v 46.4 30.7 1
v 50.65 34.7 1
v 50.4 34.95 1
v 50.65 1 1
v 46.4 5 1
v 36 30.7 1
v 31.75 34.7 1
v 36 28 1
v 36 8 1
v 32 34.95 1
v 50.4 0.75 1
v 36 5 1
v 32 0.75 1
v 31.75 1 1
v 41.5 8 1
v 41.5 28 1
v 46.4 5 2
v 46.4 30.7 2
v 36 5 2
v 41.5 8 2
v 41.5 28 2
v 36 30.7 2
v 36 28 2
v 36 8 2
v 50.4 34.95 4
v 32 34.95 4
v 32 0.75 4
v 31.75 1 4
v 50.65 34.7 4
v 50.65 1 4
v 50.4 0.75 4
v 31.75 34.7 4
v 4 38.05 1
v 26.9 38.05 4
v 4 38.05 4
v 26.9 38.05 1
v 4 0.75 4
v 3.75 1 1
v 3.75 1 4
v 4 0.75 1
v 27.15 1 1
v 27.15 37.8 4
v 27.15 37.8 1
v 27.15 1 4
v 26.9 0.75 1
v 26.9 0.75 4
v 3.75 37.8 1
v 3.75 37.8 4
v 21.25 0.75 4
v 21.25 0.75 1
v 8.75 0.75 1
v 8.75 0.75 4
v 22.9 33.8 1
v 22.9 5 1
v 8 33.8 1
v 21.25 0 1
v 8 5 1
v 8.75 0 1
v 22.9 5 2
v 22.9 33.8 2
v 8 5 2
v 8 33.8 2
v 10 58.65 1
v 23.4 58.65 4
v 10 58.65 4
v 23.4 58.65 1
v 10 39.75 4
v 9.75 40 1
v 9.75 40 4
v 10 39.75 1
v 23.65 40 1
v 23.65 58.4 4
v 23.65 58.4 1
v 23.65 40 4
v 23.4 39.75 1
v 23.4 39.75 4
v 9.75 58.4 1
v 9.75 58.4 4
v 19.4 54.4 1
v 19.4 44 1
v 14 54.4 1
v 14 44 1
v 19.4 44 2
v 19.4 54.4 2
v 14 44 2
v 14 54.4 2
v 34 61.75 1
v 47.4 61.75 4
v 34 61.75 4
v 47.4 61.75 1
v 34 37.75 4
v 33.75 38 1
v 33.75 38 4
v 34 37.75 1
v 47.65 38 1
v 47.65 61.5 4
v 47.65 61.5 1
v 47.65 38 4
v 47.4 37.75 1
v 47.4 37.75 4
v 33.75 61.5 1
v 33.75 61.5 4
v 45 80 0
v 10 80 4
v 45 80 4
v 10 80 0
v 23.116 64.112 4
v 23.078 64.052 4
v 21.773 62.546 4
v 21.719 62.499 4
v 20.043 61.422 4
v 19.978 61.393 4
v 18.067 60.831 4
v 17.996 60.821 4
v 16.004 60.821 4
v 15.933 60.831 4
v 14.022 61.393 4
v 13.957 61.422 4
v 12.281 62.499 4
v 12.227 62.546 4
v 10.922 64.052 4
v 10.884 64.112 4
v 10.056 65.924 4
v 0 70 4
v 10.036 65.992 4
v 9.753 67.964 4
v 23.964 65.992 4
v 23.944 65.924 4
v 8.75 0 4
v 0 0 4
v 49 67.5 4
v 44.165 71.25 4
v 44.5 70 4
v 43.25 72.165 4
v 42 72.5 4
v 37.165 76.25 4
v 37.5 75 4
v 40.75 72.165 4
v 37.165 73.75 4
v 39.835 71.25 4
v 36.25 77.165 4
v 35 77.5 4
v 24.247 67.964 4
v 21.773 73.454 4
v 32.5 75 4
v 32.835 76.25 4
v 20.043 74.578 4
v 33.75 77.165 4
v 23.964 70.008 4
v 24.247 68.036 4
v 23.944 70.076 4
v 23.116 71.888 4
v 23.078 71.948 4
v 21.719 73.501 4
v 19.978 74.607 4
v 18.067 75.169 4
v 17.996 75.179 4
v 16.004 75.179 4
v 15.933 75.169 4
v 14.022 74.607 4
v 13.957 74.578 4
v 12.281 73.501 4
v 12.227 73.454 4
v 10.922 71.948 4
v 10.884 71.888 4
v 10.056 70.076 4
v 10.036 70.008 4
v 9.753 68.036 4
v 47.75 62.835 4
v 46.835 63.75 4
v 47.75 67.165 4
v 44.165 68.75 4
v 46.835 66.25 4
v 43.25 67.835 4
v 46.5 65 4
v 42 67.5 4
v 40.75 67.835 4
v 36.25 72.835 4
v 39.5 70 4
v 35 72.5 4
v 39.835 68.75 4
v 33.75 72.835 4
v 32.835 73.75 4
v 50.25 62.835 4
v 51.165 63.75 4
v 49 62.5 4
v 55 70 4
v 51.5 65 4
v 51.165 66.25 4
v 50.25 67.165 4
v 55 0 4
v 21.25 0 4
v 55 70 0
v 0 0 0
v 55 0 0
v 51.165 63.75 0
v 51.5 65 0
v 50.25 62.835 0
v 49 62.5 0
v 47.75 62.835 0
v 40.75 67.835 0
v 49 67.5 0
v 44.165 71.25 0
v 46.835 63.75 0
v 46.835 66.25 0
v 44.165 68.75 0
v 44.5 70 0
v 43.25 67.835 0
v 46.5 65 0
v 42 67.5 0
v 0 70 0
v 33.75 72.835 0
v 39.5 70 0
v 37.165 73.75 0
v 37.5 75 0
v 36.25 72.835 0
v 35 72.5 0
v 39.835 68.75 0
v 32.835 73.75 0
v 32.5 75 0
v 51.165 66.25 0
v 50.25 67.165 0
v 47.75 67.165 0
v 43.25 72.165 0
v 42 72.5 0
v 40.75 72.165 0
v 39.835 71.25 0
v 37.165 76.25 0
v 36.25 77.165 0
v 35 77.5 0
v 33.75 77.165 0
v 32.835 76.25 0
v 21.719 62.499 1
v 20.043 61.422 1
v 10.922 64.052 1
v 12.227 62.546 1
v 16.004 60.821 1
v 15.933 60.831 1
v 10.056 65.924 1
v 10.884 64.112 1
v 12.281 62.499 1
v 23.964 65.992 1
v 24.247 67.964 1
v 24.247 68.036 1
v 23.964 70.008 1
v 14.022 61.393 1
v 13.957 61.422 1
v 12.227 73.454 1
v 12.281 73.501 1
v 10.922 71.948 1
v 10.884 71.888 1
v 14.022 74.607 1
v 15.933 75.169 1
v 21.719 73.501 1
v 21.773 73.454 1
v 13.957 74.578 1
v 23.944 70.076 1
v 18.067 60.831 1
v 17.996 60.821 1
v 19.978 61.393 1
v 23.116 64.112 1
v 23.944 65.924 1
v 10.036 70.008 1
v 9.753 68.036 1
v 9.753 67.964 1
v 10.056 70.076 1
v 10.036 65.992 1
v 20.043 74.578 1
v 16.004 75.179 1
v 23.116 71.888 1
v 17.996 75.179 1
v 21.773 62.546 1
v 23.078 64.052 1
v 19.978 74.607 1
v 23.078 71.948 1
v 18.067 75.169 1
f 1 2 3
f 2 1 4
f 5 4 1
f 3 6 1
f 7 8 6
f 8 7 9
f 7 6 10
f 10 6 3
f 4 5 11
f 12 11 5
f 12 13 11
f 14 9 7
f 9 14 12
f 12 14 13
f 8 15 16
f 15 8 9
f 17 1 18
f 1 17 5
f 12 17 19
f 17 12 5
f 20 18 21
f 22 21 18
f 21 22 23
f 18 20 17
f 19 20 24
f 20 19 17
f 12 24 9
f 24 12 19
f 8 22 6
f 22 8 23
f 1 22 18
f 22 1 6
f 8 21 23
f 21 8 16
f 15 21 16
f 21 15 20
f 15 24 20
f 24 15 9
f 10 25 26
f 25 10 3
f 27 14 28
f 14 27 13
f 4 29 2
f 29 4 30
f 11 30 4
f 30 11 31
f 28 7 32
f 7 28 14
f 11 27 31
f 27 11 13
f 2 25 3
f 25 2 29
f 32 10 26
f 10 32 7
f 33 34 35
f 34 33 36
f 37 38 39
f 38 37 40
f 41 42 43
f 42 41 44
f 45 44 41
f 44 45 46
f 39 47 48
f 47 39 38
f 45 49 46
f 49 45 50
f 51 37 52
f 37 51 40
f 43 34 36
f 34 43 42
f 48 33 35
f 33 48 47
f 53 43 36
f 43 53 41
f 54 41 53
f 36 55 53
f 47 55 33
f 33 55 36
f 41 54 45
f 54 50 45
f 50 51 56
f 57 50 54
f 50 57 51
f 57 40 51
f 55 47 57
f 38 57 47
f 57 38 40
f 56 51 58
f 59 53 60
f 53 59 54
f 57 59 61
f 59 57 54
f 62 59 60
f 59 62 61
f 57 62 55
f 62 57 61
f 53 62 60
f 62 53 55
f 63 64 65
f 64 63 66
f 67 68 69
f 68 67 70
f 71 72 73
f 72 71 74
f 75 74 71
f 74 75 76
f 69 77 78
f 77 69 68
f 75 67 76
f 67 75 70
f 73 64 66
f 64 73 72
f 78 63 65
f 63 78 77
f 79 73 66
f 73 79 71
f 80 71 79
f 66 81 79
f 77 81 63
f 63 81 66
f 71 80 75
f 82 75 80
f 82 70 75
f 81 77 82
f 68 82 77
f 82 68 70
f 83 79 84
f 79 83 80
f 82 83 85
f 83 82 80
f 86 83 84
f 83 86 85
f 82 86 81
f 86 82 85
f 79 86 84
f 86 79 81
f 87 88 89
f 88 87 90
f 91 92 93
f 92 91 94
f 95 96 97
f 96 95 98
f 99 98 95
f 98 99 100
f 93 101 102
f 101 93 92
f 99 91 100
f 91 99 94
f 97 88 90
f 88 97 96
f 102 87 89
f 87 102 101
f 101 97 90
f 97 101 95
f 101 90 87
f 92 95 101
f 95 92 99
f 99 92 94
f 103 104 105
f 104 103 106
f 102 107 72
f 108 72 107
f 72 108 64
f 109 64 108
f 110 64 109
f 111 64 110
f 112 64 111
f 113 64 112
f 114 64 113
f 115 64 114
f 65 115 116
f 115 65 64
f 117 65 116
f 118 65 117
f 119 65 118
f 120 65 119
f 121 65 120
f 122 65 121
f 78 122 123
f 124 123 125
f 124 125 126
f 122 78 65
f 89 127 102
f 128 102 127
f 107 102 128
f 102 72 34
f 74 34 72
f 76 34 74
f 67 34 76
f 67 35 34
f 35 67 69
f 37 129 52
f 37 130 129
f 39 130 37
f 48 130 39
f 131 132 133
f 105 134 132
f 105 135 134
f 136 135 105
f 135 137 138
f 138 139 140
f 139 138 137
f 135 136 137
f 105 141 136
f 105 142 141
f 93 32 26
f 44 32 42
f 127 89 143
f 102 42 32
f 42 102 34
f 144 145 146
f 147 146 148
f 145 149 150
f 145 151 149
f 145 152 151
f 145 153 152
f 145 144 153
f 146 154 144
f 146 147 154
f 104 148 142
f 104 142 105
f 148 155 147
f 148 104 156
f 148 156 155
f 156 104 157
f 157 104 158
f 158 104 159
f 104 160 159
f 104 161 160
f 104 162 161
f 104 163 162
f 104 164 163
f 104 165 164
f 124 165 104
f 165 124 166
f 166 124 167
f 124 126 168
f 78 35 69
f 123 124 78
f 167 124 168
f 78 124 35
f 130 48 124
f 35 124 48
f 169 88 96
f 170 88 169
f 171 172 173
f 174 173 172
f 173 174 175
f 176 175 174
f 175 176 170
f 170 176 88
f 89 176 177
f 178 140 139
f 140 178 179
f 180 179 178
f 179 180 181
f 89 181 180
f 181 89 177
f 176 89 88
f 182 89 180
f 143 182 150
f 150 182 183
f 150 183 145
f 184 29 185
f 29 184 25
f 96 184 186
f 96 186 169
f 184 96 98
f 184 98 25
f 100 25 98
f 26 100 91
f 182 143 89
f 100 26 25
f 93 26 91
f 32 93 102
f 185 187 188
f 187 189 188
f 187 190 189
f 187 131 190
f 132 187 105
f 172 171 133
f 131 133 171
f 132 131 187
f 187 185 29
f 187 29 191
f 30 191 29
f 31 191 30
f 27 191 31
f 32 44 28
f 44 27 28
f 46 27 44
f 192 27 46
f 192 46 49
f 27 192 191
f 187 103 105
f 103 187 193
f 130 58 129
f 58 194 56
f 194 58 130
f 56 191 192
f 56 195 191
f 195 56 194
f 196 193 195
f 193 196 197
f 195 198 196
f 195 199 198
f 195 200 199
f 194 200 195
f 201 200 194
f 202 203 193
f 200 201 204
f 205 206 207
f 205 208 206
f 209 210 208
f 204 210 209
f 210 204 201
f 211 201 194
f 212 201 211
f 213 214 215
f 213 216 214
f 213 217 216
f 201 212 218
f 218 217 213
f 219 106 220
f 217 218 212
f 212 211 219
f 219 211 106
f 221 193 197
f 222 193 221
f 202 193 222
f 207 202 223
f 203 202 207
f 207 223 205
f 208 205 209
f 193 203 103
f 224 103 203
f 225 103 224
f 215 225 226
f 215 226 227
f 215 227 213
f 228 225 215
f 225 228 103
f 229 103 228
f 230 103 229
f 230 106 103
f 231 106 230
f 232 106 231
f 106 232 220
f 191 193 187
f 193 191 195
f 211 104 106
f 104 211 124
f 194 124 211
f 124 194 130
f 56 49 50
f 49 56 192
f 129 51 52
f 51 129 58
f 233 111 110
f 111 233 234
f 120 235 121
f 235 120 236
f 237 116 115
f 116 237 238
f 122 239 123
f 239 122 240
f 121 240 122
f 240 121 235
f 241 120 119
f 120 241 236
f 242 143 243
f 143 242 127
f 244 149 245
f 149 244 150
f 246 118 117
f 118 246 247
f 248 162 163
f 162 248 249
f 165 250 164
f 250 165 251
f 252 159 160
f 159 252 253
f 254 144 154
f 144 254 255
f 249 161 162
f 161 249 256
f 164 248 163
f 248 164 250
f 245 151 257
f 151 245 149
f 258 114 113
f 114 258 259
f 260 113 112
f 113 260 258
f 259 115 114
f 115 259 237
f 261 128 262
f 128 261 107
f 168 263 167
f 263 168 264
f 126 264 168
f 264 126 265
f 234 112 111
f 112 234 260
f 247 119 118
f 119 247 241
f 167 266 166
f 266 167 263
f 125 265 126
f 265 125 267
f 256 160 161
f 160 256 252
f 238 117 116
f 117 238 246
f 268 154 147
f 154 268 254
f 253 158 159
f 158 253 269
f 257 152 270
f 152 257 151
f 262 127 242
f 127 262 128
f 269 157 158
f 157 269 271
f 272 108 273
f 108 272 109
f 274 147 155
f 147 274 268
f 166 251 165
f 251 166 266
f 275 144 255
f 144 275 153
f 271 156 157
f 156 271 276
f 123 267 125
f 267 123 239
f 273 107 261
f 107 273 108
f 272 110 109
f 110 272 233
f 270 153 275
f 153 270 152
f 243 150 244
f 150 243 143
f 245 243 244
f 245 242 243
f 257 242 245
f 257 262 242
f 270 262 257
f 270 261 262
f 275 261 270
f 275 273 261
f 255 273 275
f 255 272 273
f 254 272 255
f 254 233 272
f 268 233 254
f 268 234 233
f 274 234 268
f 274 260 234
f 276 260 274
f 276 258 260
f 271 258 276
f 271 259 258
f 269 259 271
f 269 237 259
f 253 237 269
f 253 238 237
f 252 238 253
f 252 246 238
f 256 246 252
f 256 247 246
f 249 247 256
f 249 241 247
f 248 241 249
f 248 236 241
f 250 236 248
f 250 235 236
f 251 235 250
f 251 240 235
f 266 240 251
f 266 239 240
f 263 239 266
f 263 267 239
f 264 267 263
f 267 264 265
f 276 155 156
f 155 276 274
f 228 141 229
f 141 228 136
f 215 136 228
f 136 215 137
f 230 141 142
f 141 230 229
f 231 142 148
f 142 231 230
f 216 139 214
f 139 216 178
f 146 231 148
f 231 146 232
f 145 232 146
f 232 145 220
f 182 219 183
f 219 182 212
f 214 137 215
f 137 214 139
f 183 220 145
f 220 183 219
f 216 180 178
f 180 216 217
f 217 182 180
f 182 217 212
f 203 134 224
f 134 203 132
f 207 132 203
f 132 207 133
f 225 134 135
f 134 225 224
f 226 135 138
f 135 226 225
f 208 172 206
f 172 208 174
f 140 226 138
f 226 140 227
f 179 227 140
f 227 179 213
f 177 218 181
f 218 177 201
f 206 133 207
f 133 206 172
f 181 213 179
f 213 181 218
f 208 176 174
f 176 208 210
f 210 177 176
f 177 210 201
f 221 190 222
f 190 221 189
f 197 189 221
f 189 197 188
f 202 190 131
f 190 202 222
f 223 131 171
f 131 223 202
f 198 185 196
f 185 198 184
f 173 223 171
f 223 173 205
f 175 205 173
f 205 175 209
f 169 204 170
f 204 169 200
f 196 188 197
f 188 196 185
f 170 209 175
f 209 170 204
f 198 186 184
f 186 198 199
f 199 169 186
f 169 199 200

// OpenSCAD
/*
// Base 1 plate
B1p=[ [0,0], [55,0], [55,70], [45,80],
[10,80], [0,70] ];
translate([0,0,0]) color("gray")
linear_extrude(height=1)
polygon(points=B1p);
*/
tol=0.25;
extra=4;

//union(){ // make the 3 ribs part of the base

difference(){   // cut the board and components out of 
    // the base plate #1
    
// Base 1 plate
B1p=[ [0,0], [55,0], [55,70], [45,80],
[10,80], [0,70] ];
translate([0,0,0]) color("gray")
linear_extrude(height=4)
polygon(points=B1p);

//union(){
// Pro Mini
translate([32,1,1]) color("red"){
    difference(){
        linear_extrude(height=0.86+extra) 
        offset(r=tol) square(size=[18.4, 33.7]);

        difference(){
        linear_extrude(height=1) 
        offset(r=-4) square(size=[18.4, 33.7]);

        linear_extrude(height=1) 
        translate([3.5,7,0]) square(size=[6,20]);
        }

    }
}

// Adafruit PowerBoost 1000c
translate([4,1,1]) color("blue"){
    difference(){
        linear_extrude(height=1.7+extra) 
        offset(r=tol) square(size=[22.9, 36.8]);

        linear_extrude(height=1) 
        offset(r=-4) square(size=[22.9, 36.8]);
    }
}
// notch for the USB charger cable
translate([9,0,1]) color("pink"){
    linear_extrude(height=1.7+extra) 
        offset(r=tol) square(size=[12, 2]);
}

// TXB0104 Level Shifter
translate([10,40,1]) color("green") {
    difference(){
        linear_extrude(height=1.7+extra) 
        offset(r=tol) square(size=[13.4, 18.4]);
            
        linear_extrude(height=1) 
        offset(r=-4) square(size=[13.4, 18.4]);
    }
}

// LIS3DH
translate([34,38,1]) color("yellow") {
    linear_extrude(height=1.7+extra) 
    offset(r=tol)
     square(size=[13.4, 23.5]);
        
    linear_extrude(height=3.3) 
     offset(r=-3)
      square(size=[13.4, 23.5]);
 
}

// Piezo
translate([17,68,1]) color("orange") {
    linear_extrude(height=1.4+extra) 
    offset(r=tol)
     circle(r=7);
}

// Led holes
translate([35,75,-2]) color("red") {
cylinder(h=8,r=2.5,$fn=12);
}
translate([42,70,-2]) color("yellow") {
cylinder(h=8,r=2.5,$fn=12);
}
translate([49,65,-2]) color("green") {
cylinder(h=8,r=2.5,$fn=12);
}

//} // end of union

} // end of diffence

/* don't need the ribs
// rib1
translate([0,0,0]) color("cyan")
linear_extrude(height=6)
square(size=[3,70]);
// rig2
translate([28,0,0]) color("cyan")
linear_extrude(height=6)
square(size=[3,80]);
//rib3
translate([52,0,0]) color("cyan")
linear_extrude(height=6)
square(size=[3,70]);
*/
